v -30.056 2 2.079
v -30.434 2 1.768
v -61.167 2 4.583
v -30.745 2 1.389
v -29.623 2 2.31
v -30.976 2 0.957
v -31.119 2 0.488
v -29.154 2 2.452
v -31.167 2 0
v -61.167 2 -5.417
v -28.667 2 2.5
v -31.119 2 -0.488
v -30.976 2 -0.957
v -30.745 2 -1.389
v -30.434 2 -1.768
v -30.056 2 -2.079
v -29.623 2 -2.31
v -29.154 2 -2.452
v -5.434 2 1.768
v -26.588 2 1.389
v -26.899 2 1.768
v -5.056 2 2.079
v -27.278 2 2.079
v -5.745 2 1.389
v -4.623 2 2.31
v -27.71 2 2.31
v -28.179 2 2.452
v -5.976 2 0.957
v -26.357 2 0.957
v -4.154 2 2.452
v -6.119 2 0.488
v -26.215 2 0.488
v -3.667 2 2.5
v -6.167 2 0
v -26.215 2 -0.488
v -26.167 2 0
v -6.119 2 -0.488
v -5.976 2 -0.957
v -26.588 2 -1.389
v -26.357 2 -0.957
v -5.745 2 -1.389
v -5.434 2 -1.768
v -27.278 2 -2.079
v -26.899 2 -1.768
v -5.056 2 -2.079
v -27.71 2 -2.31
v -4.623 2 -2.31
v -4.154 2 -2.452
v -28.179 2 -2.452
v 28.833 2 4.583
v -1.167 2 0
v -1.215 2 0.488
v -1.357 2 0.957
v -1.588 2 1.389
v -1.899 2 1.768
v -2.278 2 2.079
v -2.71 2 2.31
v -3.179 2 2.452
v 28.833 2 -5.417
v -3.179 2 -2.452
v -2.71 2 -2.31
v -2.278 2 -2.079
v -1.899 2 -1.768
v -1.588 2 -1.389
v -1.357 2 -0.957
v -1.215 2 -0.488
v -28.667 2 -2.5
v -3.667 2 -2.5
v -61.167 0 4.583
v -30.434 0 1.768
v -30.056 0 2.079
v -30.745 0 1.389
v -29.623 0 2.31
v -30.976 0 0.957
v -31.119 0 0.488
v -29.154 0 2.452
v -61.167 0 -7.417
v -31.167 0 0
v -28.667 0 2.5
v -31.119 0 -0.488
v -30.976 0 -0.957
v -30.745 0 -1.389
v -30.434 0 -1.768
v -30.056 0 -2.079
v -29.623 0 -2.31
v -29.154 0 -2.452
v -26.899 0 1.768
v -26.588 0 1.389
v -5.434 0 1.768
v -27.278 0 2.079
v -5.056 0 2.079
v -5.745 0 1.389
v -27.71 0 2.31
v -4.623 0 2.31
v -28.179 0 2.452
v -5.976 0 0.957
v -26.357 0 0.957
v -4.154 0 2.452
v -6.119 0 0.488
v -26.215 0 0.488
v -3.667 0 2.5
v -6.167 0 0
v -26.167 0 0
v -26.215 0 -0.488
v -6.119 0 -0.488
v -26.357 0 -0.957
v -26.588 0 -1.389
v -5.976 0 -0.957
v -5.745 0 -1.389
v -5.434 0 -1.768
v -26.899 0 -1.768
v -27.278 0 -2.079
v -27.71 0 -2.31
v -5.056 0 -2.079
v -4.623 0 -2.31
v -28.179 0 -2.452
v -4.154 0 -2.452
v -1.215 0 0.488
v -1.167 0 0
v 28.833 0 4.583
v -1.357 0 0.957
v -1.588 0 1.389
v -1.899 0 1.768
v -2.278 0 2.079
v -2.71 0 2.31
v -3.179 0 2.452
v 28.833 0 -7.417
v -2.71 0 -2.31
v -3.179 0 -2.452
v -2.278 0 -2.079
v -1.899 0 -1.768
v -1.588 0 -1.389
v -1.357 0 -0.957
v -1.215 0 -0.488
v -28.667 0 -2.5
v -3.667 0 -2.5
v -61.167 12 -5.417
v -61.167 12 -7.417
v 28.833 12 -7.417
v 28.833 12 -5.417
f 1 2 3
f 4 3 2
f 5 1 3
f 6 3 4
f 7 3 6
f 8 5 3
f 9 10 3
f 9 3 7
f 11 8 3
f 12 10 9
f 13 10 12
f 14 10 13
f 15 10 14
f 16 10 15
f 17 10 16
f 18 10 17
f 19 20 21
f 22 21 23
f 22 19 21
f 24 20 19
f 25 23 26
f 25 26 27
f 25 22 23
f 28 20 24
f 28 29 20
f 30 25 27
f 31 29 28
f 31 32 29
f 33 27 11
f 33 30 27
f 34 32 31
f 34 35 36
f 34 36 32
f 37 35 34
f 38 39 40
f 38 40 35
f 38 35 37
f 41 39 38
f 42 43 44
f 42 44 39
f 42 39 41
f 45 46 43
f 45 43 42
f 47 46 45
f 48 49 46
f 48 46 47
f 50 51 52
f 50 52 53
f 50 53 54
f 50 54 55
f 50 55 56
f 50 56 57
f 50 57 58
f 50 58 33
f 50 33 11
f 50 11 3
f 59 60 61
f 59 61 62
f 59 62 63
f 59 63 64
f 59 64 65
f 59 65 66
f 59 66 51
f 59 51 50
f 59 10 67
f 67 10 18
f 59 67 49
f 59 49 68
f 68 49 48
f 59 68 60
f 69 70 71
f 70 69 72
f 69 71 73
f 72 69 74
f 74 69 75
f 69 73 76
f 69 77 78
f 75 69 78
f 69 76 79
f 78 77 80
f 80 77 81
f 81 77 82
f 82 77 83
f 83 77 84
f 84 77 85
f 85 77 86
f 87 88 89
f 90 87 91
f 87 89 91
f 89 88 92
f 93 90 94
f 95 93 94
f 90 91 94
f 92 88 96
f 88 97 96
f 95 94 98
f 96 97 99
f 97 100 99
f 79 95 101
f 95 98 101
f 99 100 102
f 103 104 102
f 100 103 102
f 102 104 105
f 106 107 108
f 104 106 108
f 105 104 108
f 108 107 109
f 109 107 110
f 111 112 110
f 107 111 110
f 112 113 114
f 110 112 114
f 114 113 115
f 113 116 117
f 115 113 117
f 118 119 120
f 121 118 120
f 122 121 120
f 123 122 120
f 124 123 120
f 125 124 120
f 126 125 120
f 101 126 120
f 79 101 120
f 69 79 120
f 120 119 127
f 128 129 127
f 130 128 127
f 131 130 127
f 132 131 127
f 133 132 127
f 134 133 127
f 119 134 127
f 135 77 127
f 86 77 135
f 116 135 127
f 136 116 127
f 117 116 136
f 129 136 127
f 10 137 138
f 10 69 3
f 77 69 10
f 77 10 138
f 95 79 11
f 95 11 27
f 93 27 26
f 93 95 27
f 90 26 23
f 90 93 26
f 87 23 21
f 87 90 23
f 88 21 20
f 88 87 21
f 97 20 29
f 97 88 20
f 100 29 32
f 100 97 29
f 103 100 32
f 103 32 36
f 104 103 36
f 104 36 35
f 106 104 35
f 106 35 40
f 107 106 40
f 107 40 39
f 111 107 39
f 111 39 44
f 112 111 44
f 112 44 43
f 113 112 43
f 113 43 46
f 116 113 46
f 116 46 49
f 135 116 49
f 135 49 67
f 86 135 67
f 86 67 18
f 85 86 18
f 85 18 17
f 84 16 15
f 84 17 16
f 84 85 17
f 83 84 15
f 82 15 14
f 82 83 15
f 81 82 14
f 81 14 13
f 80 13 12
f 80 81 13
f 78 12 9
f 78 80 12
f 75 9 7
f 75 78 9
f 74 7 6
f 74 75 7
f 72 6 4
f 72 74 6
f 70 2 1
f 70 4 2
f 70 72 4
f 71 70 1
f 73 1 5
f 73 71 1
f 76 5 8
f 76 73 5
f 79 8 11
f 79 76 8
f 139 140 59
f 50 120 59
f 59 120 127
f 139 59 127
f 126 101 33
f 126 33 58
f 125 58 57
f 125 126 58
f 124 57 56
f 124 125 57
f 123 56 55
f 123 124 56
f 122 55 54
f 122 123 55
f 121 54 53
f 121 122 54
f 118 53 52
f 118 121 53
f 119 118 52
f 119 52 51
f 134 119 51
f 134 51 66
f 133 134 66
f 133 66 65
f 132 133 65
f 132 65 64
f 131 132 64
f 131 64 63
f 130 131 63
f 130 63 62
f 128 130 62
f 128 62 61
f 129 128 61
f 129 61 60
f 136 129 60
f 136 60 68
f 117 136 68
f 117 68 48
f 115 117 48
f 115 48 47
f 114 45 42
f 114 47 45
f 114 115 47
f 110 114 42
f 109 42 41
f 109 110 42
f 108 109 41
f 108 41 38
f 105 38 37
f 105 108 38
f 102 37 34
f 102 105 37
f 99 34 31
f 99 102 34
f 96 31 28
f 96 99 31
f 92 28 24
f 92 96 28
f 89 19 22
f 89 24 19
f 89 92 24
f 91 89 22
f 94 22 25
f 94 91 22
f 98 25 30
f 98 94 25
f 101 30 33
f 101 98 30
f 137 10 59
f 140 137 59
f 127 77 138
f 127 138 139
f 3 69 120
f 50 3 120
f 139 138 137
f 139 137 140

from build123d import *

# Parameters (mm, degrees)
SKETCH1_W               = 90
SKETCH1_H               = 12
BOSS_EXTRUDE1_DEPTH     = 2
SKETCH2_W               = 90
SKETCH2_H               = 2
BOSS_EXTRUDE2_DEPTH     = 10
CUT_EXTRUDE1_DEPTH      = 63.420894383
CUT_EXTRUDE1_DEPTH_BACK = 63.420894383
SKETCH3_R               = 2.5


with BuildPart() as part:
    # Sketch1 → Boss-Extrude1 (new body)
    with BuildSketch(Plane(origin=(0, 0, 0), x_dir=(1, 0, 0), z_dir=(0, 1, 0))):
        with Locations((-16.166666667, 1.416666667)):
            Rectangle(SKETCH1_W, SKETCH1_H)
    extrude(amount=BOSS_EXTRUDE1_DEPTH)

    # Sketch2 → Boss-Extrude2 (add)
    with BuildSketch(Plane(origin=(0, 2, 0), x_dir=(1, 0, 0), z_dir=(0, 1, 0))):
        with Locations((-16.166666667, 6.416666667)):
            Rectangle(SKETCH2_W, SKETCH2_H)
    extrude(amount=BOSS_EXTRUDE2_DEPTH)

    # Sketch3 → Cut-Extrude1 (cut, two sides: drawn at the far end of the back side and taken through both)
    with BuildSketch(Plane(origin=(0, 2, 0), x_dir=(1, 0, 0), z_dir=(0, 1, 0)).offset(-CUT_EXTRUDE1_DEPTH_BACK)):
        with Locations(Location((-28.666666667, 0, 0), (0, 0, 270))):
            Circle(SKETCH3_R)
        with Locations(Location((-3.666666667, 0, 0), (0, 0, 270))):
            Circle(SKETCH3_R)
    extrude(amount=CUT_EXTRUDE1_DEPTH + CUT_EXTRUDE1_DEPTH_BACK, mode=Mode.SUBTRACT)


solid = part.part
